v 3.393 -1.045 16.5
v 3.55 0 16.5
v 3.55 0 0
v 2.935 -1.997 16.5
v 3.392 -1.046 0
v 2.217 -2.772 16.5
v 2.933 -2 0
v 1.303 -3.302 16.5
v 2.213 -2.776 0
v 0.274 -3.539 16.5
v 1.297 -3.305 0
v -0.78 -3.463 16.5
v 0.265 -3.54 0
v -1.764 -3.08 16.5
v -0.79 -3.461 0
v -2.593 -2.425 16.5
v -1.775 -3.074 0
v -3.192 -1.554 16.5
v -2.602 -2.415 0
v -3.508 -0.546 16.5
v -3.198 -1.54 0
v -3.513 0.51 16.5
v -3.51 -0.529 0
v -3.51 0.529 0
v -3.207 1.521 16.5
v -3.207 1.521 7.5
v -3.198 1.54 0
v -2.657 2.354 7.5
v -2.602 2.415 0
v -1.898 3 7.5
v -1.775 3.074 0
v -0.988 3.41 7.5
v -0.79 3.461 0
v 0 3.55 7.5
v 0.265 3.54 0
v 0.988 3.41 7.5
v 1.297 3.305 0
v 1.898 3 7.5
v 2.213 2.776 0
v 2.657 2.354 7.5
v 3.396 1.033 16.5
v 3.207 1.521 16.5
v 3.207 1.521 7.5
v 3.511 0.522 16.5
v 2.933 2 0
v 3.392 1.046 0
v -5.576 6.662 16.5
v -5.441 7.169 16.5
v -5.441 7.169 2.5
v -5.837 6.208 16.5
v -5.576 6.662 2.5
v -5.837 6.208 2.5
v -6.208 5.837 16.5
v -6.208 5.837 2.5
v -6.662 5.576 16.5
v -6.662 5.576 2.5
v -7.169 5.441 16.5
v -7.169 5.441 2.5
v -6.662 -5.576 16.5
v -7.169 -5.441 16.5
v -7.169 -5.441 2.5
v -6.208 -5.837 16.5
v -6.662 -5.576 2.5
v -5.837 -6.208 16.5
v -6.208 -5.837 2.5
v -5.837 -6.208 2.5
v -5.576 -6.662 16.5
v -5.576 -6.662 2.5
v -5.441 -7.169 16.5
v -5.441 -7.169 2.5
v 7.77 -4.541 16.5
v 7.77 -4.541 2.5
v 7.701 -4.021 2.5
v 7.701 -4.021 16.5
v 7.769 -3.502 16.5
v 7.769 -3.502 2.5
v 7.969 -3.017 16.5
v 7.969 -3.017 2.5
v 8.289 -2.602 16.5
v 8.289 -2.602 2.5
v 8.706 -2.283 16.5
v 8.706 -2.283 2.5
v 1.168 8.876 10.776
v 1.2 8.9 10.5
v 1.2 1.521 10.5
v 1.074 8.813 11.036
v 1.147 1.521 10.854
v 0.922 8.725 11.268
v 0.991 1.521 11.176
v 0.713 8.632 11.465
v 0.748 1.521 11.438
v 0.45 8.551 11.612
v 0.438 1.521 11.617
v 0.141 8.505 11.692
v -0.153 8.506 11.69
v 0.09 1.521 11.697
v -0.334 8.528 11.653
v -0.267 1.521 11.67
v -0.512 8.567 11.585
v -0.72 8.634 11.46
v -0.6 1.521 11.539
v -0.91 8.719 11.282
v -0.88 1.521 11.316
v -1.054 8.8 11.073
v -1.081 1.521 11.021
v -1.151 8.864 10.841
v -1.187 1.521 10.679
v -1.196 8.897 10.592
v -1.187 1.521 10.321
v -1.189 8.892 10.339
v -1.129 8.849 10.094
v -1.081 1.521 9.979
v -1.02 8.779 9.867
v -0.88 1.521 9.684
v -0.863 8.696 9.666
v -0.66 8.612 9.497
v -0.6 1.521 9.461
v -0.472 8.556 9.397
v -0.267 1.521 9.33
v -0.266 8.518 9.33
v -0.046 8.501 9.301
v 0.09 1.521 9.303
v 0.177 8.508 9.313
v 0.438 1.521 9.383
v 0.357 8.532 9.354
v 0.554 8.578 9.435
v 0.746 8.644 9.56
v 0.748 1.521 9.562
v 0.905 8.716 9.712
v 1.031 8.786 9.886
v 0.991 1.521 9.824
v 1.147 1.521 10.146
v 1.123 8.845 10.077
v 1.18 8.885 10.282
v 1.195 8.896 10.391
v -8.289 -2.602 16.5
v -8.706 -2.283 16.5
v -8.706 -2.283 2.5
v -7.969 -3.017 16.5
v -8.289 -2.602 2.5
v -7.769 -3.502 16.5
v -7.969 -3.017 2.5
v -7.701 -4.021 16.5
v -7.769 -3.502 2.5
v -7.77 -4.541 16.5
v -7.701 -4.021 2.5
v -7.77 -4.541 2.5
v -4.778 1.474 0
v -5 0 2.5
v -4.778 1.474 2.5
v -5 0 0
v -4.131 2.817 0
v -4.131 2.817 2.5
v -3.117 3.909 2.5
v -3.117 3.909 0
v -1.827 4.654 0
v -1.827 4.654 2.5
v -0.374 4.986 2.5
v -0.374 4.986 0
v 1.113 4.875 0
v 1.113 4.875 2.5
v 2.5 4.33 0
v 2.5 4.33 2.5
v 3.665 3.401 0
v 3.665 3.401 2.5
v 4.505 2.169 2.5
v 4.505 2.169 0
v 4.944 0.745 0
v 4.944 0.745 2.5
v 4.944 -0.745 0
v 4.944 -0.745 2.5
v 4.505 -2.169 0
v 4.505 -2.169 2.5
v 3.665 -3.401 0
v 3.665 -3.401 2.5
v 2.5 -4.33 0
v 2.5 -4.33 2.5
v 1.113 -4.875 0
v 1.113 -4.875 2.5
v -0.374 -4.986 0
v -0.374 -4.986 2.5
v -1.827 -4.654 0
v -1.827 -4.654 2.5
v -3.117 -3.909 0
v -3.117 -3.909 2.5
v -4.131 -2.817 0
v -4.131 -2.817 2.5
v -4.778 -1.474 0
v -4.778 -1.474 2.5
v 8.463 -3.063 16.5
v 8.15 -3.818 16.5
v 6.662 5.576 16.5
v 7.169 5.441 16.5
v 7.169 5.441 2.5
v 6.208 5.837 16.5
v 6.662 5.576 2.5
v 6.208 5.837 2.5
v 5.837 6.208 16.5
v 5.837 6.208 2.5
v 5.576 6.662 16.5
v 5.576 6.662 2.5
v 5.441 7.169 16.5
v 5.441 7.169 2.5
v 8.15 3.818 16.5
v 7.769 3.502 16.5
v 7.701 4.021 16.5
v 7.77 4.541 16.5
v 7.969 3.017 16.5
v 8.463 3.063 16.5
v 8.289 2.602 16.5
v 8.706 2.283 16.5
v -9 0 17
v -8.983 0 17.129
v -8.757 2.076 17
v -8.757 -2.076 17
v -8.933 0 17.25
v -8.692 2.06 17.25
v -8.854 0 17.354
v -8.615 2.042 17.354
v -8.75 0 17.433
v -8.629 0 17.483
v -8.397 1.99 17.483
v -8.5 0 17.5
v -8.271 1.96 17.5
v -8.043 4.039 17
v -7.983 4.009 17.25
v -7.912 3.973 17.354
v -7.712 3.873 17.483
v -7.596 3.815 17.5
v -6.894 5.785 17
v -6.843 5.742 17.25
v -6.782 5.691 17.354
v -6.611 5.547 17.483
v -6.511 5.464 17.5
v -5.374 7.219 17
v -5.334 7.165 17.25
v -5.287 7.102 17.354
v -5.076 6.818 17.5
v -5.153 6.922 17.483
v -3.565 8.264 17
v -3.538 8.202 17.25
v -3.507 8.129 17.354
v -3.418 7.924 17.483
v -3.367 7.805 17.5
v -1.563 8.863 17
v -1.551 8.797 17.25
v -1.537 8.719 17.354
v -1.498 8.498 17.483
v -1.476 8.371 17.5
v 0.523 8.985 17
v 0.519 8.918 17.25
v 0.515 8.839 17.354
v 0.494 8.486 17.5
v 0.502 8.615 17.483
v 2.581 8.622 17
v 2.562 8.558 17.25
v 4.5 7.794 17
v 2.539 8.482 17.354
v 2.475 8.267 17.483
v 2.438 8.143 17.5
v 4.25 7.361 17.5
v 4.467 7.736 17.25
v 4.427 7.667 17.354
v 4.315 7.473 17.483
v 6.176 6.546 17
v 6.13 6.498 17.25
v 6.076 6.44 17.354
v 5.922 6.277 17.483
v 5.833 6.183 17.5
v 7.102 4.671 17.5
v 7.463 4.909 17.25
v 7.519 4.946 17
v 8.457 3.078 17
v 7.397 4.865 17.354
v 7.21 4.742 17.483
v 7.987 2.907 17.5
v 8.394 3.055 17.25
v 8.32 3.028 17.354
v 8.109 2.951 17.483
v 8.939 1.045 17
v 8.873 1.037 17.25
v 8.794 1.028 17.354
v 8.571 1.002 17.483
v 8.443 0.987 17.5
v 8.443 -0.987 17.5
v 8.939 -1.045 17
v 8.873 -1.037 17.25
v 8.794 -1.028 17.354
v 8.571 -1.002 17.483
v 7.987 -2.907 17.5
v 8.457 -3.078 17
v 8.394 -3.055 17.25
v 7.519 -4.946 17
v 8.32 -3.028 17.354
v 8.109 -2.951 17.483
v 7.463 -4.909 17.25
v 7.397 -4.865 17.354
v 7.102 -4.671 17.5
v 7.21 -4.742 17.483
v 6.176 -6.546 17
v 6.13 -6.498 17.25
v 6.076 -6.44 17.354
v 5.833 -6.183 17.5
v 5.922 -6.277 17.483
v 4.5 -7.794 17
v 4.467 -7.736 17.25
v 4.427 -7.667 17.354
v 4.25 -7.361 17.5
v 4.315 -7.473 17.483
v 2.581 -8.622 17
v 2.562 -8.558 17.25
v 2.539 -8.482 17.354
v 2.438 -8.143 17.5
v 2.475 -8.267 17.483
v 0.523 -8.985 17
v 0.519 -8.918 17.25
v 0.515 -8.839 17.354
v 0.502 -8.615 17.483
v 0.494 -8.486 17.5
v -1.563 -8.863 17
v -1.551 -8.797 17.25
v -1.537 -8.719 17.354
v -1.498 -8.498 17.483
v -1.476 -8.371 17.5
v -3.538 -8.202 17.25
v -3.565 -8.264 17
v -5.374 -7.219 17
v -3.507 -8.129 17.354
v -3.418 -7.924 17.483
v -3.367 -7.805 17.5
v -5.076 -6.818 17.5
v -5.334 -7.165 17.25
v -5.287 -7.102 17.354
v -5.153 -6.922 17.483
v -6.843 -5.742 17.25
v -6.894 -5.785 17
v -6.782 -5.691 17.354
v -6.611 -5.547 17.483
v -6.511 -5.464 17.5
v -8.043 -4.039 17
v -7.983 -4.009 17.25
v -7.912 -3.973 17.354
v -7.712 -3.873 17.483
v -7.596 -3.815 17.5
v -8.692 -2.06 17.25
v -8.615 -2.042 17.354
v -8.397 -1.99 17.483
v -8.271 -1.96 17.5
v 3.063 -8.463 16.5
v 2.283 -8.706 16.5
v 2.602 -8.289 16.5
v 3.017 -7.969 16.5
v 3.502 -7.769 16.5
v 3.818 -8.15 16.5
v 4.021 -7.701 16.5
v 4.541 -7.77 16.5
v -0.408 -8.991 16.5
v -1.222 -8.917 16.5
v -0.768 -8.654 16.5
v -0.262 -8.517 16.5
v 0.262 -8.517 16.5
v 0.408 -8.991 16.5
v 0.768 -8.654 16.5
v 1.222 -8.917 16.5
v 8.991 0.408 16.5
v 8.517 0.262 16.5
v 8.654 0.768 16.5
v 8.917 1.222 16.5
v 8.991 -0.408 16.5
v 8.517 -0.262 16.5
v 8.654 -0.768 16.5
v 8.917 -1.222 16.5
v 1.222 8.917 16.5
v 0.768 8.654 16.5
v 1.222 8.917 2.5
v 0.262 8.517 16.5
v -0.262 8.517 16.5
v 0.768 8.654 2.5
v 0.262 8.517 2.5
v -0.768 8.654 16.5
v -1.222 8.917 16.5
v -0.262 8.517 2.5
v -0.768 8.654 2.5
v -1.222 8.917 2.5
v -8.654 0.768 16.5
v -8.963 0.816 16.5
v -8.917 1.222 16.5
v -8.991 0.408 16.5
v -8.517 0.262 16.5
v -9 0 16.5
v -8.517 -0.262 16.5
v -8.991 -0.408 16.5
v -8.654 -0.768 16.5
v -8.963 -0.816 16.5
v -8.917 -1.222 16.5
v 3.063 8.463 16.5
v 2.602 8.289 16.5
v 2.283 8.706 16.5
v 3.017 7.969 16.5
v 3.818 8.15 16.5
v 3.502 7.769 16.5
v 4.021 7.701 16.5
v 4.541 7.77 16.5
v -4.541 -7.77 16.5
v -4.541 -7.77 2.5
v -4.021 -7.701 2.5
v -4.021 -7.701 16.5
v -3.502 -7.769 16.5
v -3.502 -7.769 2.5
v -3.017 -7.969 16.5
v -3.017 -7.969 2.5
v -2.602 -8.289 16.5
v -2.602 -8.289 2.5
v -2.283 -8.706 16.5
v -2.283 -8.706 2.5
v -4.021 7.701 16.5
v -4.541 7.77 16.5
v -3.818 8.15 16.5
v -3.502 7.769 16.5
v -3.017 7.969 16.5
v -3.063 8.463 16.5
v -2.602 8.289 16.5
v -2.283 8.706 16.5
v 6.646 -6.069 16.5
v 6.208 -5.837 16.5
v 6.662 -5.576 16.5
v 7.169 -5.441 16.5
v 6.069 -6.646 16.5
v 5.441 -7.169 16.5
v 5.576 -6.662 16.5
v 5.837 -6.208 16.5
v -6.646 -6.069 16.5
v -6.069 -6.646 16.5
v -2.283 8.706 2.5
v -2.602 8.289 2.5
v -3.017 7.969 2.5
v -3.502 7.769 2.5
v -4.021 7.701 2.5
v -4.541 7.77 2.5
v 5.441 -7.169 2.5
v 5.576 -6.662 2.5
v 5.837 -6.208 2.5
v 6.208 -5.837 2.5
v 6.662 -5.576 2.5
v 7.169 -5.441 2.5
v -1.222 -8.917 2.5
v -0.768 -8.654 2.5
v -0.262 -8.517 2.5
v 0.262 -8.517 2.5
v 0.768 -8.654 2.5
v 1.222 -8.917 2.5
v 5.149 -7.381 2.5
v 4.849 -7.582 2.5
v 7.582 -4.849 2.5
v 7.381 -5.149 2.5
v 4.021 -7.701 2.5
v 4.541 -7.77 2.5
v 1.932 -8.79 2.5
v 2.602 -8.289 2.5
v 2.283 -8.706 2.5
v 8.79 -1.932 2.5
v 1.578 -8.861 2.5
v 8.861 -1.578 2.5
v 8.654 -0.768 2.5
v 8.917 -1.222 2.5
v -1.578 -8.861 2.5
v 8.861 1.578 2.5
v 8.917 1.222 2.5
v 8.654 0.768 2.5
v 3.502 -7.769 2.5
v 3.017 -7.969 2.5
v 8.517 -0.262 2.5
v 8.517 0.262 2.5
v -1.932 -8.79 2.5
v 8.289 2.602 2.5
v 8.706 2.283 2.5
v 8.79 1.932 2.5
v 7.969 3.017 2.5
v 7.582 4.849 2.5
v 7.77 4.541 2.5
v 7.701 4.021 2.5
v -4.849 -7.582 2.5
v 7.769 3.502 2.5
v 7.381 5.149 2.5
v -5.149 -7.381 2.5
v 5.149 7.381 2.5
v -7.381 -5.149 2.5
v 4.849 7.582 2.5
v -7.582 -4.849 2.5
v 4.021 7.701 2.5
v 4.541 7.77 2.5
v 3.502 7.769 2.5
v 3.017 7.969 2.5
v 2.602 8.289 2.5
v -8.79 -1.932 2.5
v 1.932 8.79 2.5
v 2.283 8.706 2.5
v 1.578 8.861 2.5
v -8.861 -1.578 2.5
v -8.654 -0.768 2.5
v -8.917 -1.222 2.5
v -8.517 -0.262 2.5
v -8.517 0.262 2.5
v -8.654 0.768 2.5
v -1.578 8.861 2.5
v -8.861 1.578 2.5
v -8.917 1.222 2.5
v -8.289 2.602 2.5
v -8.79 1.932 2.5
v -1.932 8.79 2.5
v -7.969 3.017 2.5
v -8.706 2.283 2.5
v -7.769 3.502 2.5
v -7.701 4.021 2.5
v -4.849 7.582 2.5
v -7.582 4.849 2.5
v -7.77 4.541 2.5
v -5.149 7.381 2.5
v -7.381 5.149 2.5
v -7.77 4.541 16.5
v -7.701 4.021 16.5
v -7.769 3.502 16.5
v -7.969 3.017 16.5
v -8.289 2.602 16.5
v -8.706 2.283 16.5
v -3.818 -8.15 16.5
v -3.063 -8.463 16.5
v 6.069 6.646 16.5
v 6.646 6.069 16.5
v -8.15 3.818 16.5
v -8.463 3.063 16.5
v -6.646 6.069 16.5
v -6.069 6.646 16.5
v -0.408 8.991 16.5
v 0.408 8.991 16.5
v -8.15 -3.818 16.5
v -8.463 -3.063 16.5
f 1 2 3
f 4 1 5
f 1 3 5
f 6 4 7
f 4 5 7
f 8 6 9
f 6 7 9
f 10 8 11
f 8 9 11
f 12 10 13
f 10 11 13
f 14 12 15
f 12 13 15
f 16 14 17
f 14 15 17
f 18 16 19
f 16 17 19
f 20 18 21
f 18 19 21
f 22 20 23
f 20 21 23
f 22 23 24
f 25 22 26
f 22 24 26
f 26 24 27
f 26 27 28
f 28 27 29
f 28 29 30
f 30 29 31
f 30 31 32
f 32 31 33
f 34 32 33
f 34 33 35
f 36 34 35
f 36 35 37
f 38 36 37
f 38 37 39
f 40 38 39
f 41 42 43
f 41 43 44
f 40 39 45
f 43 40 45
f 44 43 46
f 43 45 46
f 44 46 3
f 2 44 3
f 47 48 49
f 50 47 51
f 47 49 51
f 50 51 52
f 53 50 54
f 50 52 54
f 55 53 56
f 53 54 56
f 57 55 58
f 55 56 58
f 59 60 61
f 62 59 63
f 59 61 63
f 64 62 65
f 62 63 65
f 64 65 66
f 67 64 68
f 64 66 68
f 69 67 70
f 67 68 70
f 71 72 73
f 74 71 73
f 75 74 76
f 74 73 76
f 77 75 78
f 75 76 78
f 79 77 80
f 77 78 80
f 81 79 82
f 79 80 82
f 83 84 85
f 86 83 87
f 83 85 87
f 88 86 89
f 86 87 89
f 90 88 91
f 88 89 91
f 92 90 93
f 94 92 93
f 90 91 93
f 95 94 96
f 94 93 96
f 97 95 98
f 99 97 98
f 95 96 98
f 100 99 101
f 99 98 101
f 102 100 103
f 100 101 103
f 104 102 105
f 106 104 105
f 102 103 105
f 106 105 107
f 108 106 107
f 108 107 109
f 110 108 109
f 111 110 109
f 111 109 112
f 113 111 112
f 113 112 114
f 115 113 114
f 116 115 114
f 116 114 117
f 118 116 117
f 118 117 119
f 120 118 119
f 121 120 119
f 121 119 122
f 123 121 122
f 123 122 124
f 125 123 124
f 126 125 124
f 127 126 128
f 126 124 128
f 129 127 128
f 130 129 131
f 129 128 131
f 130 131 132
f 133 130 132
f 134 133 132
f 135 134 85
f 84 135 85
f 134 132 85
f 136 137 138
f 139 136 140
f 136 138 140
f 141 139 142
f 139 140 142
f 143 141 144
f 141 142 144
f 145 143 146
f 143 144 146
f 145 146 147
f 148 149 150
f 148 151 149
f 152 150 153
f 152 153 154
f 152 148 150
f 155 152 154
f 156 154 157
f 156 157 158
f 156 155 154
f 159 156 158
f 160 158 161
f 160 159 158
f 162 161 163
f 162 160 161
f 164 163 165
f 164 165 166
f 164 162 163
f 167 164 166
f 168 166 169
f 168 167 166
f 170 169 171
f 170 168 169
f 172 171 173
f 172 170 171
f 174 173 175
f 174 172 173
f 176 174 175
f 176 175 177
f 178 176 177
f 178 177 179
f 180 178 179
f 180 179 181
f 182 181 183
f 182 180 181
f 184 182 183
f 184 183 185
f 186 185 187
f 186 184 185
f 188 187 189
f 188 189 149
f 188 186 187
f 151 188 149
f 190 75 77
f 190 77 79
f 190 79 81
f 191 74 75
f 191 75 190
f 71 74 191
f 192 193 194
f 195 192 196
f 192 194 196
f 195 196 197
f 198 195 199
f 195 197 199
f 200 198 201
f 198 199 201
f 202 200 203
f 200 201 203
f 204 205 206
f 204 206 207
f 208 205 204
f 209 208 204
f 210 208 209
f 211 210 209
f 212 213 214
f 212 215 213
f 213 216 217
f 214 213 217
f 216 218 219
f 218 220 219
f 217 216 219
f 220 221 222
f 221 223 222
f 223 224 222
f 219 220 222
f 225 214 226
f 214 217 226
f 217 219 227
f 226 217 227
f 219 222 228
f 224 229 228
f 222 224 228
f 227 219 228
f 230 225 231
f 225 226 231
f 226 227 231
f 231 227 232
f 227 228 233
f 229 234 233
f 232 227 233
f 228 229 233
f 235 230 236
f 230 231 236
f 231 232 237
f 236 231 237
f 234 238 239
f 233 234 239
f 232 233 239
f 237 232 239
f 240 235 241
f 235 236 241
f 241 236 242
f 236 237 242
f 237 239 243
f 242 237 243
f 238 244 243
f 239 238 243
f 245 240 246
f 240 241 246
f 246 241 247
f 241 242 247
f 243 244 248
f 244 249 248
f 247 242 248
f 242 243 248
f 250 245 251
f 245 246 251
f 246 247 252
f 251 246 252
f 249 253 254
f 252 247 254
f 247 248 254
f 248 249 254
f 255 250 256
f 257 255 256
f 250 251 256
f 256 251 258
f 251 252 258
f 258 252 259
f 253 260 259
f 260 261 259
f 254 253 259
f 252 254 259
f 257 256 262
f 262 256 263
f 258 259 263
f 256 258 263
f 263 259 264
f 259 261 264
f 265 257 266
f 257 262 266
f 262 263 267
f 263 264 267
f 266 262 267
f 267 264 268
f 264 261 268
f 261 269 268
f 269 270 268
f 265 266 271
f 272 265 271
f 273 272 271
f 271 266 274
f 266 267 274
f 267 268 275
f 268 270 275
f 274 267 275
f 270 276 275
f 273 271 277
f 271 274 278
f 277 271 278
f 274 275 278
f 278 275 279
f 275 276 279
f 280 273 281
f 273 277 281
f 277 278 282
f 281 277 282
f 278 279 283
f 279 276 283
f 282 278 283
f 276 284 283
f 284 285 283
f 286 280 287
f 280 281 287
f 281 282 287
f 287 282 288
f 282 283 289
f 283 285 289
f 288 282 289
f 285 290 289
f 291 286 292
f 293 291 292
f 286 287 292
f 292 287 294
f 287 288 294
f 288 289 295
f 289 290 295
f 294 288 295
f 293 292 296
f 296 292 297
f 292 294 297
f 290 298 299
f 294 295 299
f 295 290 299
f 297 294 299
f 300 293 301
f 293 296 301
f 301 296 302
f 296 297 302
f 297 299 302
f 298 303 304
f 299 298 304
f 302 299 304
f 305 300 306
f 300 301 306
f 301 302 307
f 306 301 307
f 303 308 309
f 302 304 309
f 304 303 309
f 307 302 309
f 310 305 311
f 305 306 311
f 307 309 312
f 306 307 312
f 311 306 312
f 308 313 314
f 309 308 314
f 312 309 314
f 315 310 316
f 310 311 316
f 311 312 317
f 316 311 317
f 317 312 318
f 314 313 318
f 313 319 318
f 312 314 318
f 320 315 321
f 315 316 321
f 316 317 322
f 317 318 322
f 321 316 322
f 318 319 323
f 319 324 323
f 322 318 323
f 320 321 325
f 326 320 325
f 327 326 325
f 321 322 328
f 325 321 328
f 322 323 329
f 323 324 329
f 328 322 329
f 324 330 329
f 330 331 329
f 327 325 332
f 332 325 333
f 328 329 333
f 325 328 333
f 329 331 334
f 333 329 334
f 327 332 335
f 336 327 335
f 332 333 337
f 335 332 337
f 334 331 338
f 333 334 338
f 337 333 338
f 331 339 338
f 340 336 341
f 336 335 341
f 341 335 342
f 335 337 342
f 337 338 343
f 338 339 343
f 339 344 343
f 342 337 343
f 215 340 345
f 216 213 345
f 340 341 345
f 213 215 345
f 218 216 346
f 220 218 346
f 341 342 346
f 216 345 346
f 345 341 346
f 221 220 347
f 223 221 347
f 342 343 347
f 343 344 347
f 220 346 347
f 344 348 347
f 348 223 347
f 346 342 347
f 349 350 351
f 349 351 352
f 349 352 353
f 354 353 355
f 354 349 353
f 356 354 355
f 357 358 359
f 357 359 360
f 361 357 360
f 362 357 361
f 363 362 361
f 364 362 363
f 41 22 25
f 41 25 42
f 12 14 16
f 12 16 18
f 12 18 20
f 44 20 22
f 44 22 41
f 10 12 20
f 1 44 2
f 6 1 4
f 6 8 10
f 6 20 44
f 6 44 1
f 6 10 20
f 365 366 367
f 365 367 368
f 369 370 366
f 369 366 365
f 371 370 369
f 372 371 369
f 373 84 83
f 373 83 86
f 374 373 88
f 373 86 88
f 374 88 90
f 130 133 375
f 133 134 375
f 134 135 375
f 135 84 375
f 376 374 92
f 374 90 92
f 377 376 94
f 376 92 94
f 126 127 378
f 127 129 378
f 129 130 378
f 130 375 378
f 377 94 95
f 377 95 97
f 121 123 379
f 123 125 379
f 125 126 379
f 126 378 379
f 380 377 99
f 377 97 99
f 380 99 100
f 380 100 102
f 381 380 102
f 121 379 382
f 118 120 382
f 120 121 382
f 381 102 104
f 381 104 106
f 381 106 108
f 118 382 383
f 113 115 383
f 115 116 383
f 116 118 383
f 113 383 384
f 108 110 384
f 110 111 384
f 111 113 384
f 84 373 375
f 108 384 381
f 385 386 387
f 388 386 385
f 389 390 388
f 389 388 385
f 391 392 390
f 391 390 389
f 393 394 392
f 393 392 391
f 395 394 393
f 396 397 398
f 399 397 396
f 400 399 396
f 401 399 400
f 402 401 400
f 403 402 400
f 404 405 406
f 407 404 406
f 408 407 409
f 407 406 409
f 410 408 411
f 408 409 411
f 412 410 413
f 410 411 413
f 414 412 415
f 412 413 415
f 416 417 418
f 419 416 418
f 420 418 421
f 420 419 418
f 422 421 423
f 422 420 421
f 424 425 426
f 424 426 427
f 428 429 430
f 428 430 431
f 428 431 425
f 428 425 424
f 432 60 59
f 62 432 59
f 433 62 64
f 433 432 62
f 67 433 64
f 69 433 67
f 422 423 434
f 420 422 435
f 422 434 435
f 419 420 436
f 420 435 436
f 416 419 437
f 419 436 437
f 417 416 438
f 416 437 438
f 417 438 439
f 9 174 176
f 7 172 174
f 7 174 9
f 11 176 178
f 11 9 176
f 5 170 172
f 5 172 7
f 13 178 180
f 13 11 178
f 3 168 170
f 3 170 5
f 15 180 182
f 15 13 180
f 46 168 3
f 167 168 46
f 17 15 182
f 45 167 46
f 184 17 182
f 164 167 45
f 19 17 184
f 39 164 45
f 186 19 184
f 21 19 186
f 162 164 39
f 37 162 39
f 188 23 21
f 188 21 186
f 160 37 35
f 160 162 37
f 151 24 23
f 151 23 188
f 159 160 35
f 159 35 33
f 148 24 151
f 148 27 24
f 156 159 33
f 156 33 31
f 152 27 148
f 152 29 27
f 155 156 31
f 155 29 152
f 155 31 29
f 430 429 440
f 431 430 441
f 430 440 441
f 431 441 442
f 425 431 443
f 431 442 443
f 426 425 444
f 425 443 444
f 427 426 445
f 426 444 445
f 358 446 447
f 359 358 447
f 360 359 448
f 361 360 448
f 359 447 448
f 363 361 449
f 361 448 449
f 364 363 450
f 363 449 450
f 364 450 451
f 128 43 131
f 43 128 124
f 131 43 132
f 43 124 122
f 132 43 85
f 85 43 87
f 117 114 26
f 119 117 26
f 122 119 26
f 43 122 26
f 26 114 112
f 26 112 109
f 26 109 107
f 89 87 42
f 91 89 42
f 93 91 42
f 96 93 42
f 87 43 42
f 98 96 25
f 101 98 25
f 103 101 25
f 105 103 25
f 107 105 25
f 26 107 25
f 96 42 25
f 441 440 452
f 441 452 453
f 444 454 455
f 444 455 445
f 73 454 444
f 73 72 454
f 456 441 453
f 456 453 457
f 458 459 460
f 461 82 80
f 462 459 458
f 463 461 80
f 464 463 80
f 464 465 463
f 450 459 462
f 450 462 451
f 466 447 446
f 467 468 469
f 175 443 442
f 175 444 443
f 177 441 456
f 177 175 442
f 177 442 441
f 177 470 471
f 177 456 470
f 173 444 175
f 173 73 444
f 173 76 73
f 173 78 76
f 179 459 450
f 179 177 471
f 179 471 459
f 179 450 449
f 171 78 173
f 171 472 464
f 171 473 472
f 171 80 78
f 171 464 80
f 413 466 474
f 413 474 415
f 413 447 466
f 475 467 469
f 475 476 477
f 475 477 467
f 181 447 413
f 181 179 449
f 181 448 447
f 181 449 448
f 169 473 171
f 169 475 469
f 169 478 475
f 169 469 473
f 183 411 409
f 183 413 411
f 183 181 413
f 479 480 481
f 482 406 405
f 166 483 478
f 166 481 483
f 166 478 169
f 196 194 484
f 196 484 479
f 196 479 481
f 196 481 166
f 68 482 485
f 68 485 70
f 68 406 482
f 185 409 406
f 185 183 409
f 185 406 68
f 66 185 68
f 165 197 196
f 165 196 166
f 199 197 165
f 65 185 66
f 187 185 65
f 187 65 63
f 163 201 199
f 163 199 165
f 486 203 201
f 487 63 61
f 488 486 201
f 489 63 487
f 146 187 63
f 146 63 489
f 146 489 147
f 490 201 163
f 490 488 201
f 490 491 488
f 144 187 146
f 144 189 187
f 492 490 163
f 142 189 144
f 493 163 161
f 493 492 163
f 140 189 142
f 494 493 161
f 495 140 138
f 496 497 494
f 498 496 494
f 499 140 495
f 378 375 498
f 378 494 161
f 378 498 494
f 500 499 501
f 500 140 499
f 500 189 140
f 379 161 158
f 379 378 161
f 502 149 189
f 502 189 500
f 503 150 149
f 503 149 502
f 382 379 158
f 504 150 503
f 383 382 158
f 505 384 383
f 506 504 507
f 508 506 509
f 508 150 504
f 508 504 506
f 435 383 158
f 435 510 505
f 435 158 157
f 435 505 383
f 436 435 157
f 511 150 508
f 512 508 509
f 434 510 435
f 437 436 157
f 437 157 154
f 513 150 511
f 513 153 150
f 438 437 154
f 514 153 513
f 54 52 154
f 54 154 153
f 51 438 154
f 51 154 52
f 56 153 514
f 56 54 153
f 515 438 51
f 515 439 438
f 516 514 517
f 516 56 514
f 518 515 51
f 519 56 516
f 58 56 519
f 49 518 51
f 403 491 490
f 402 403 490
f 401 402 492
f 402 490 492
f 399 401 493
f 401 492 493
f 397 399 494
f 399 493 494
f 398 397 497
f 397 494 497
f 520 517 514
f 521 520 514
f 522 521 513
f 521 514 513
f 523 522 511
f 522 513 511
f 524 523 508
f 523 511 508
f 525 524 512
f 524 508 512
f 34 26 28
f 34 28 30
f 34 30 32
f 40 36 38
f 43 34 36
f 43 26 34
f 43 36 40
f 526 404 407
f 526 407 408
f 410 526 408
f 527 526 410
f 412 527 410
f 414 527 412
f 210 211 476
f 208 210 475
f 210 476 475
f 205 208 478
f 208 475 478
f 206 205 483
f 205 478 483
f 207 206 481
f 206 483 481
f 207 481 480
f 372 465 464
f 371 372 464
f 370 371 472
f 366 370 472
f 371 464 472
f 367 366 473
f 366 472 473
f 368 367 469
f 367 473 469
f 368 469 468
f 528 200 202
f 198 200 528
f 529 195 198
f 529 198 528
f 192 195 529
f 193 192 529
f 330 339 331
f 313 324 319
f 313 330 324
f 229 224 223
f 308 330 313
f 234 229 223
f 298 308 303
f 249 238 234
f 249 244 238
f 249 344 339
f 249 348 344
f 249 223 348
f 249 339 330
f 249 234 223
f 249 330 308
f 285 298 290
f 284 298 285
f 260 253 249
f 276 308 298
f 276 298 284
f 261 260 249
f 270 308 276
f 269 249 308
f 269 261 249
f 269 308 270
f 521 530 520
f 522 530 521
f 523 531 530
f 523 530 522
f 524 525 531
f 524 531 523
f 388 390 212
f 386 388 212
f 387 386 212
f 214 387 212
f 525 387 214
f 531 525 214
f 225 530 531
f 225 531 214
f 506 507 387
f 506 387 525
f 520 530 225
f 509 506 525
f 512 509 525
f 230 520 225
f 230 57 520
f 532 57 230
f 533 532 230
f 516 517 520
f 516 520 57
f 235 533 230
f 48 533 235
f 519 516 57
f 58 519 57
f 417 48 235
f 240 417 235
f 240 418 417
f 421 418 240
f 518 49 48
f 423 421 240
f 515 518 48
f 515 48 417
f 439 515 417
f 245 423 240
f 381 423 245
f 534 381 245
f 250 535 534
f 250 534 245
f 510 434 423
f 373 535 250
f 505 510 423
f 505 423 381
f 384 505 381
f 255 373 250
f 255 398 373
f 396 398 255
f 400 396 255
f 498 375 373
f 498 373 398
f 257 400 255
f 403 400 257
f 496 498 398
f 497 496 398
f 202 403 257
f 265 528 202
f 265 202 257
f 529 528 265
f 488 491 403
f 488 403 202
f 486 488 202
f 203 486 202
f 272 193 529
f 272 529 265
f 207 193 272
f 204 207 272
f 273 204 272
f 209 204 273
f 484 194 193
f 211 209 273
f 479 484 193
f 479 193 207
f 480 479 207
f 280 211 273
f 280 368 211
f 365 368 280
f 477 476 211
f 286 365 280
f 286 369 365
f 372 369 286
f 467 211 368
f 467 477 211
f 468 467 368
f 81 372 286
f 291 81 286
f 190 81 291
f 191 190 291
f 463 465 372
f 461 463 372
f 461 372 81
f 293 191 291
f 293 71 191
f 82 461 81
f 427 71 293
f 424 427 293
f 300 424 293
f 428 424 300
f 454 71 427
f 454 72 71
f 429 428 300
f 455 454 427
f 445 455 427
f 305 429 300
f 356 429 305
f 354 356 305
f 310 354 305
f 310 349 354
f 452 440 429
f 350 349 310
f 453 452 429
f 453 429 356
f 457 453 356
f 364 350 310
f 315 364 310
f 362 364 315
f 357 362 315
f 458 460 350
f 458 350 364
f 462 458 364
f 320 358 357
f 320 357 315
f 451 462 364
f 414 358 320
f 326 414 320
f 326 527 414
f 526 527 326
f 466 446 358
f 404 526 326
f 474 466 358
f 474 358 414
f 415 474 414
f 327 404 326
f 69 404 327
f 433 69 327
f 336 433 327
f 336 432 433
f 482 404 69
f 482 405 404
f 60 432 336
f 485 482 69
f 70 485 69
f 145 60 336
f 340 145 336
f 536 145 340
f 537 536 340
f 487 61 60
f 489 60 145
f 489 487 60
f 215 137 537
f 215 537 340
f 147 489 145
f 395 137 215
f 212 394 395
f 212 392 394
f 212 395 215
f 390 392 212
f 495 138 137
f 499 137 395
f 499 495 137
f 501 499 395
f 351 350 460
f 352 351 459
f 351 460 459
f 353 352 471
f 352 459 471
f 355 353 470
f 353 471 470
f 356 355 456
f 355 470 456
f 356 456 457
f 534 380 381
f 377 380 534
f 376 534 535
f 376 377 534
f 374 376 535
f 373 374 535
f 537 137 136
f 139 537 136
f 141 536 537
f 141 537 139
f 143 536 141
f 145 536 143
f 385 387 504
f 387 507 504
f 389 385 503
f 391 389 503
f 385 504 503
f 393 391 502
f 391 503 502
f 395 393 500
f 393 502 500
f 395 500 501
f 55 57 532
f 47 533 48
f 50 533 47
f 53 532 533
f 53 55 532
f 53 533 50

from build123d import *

# Parameters (mm, degrees)
F2_R      = 3.55
F3_DEPTH  = 16.5
F5_DEPTH  = 9
F6_R      = 0.5
F7_R      = 1.2
F8_DEPTH  = 10
F9_R      = 2
F10_DEPTH = 14


with BuildPart() as f1:
    # F0 (on Front) → F1 (revolve)
    with BuildSketch(Plane.XZ):
        Polygon((-5, 0), (0, 0), (0, 17.5), (-9, 17.5), (-9, 2.5), (-5, 2.5), align=None)
    revolve(axis=Axis((0, 0, -3.667768), (0, 0, -1)))

    # F2 (on face) → F3 (cut)
    with BuildSketch(Plane(origin=(0, 0, 0), x_dir=(1, 0, 0), z_dir=(0, 0, -1))):
        Circle(F2_R)
    extrude(amount=-F3_DEPTH, mode=Mode.SUBTRACT)

    # F4 (on face) → F5 (join)
    with BuildSketch(Plane(origin=(0, 0, 16.5), x_dir=(1, 0, 0), z_dir=(0, 0, -1))):
        with BuildLine():
            Line((3.207453, -1.521429), (-3.207453, -1.521429))
            ThreePointArc((-3.207453, -1.521429), (0, -3.55), (3.207453, -1.521429))
        make_face()
    extrude(amount=F5_DEPTH)

    # F6
    f6_edges = [f1.edges().sort_by_distance(p)[0] for p in [
        (9, 0, 17.5),
    ]]
    fillet(f6_edges, radius=F6_R)

    # F7 (on face) → F8 (cut)
    with BuildSketch(Plane.XZ.offset(-1.521429)):
        with Locations((0, 10.5)):
            Circle(F7_R)
    extrude(amount=-F8_DEPTH, mode=Mode.SUBTRACT)

    # F9 (on face) → F10 (cut)
    with BuildSketch(Plane(origin=(0, 0, 2.5), x_dir=(1, 0, 0), z_dir=(0, 0, -1))):
        with Locations((-10.5, 0)):
            Circle(F9_R)
        with Locations((-9.700735, -4.018176)):
            Circle(F9_R)
        with Locations((-7.424621, -7.424621)):
            Circle(F9_R)
        with Locations((-4.018176, -9.700735)):
            Circle(F9_R)
        with Locations((0, -10.5)):
            Circle(F9_R)
        with Locations((4.018176, -9.700735)):
            Circle(F9_R)
        with Locations((7.424621, -7.424621)):
            Circle(F9_R)
        with Locations((9.700735, -4.018176)):
            Circle(F9_R)
        with Locations((10.5, 0)):
            Circle(F9_R)
        with Locations((9.700735, 4.018176)):
            Circle(F9_R)
        with Locations((7.424621, 7.424621)):
            Circle(F9_R)
        with Locations((4.018176, 9.700735)):
            Circle(F9_R)
        with Locations((0, 10.5)):
            Circle(F9_R)
        with Locations((-4.018176, 9.700735)):
            Circle(F9_R)
        with Locations((-7.424621, 7.424621)):
            Circle(F9_R)
        with Locations((-9.700735, 4.018176)):
            Circle(F9_R)
    extrude(amount=-F10_DEPTH, mode=Mode.SUBTRACT)


solid = f1.part
